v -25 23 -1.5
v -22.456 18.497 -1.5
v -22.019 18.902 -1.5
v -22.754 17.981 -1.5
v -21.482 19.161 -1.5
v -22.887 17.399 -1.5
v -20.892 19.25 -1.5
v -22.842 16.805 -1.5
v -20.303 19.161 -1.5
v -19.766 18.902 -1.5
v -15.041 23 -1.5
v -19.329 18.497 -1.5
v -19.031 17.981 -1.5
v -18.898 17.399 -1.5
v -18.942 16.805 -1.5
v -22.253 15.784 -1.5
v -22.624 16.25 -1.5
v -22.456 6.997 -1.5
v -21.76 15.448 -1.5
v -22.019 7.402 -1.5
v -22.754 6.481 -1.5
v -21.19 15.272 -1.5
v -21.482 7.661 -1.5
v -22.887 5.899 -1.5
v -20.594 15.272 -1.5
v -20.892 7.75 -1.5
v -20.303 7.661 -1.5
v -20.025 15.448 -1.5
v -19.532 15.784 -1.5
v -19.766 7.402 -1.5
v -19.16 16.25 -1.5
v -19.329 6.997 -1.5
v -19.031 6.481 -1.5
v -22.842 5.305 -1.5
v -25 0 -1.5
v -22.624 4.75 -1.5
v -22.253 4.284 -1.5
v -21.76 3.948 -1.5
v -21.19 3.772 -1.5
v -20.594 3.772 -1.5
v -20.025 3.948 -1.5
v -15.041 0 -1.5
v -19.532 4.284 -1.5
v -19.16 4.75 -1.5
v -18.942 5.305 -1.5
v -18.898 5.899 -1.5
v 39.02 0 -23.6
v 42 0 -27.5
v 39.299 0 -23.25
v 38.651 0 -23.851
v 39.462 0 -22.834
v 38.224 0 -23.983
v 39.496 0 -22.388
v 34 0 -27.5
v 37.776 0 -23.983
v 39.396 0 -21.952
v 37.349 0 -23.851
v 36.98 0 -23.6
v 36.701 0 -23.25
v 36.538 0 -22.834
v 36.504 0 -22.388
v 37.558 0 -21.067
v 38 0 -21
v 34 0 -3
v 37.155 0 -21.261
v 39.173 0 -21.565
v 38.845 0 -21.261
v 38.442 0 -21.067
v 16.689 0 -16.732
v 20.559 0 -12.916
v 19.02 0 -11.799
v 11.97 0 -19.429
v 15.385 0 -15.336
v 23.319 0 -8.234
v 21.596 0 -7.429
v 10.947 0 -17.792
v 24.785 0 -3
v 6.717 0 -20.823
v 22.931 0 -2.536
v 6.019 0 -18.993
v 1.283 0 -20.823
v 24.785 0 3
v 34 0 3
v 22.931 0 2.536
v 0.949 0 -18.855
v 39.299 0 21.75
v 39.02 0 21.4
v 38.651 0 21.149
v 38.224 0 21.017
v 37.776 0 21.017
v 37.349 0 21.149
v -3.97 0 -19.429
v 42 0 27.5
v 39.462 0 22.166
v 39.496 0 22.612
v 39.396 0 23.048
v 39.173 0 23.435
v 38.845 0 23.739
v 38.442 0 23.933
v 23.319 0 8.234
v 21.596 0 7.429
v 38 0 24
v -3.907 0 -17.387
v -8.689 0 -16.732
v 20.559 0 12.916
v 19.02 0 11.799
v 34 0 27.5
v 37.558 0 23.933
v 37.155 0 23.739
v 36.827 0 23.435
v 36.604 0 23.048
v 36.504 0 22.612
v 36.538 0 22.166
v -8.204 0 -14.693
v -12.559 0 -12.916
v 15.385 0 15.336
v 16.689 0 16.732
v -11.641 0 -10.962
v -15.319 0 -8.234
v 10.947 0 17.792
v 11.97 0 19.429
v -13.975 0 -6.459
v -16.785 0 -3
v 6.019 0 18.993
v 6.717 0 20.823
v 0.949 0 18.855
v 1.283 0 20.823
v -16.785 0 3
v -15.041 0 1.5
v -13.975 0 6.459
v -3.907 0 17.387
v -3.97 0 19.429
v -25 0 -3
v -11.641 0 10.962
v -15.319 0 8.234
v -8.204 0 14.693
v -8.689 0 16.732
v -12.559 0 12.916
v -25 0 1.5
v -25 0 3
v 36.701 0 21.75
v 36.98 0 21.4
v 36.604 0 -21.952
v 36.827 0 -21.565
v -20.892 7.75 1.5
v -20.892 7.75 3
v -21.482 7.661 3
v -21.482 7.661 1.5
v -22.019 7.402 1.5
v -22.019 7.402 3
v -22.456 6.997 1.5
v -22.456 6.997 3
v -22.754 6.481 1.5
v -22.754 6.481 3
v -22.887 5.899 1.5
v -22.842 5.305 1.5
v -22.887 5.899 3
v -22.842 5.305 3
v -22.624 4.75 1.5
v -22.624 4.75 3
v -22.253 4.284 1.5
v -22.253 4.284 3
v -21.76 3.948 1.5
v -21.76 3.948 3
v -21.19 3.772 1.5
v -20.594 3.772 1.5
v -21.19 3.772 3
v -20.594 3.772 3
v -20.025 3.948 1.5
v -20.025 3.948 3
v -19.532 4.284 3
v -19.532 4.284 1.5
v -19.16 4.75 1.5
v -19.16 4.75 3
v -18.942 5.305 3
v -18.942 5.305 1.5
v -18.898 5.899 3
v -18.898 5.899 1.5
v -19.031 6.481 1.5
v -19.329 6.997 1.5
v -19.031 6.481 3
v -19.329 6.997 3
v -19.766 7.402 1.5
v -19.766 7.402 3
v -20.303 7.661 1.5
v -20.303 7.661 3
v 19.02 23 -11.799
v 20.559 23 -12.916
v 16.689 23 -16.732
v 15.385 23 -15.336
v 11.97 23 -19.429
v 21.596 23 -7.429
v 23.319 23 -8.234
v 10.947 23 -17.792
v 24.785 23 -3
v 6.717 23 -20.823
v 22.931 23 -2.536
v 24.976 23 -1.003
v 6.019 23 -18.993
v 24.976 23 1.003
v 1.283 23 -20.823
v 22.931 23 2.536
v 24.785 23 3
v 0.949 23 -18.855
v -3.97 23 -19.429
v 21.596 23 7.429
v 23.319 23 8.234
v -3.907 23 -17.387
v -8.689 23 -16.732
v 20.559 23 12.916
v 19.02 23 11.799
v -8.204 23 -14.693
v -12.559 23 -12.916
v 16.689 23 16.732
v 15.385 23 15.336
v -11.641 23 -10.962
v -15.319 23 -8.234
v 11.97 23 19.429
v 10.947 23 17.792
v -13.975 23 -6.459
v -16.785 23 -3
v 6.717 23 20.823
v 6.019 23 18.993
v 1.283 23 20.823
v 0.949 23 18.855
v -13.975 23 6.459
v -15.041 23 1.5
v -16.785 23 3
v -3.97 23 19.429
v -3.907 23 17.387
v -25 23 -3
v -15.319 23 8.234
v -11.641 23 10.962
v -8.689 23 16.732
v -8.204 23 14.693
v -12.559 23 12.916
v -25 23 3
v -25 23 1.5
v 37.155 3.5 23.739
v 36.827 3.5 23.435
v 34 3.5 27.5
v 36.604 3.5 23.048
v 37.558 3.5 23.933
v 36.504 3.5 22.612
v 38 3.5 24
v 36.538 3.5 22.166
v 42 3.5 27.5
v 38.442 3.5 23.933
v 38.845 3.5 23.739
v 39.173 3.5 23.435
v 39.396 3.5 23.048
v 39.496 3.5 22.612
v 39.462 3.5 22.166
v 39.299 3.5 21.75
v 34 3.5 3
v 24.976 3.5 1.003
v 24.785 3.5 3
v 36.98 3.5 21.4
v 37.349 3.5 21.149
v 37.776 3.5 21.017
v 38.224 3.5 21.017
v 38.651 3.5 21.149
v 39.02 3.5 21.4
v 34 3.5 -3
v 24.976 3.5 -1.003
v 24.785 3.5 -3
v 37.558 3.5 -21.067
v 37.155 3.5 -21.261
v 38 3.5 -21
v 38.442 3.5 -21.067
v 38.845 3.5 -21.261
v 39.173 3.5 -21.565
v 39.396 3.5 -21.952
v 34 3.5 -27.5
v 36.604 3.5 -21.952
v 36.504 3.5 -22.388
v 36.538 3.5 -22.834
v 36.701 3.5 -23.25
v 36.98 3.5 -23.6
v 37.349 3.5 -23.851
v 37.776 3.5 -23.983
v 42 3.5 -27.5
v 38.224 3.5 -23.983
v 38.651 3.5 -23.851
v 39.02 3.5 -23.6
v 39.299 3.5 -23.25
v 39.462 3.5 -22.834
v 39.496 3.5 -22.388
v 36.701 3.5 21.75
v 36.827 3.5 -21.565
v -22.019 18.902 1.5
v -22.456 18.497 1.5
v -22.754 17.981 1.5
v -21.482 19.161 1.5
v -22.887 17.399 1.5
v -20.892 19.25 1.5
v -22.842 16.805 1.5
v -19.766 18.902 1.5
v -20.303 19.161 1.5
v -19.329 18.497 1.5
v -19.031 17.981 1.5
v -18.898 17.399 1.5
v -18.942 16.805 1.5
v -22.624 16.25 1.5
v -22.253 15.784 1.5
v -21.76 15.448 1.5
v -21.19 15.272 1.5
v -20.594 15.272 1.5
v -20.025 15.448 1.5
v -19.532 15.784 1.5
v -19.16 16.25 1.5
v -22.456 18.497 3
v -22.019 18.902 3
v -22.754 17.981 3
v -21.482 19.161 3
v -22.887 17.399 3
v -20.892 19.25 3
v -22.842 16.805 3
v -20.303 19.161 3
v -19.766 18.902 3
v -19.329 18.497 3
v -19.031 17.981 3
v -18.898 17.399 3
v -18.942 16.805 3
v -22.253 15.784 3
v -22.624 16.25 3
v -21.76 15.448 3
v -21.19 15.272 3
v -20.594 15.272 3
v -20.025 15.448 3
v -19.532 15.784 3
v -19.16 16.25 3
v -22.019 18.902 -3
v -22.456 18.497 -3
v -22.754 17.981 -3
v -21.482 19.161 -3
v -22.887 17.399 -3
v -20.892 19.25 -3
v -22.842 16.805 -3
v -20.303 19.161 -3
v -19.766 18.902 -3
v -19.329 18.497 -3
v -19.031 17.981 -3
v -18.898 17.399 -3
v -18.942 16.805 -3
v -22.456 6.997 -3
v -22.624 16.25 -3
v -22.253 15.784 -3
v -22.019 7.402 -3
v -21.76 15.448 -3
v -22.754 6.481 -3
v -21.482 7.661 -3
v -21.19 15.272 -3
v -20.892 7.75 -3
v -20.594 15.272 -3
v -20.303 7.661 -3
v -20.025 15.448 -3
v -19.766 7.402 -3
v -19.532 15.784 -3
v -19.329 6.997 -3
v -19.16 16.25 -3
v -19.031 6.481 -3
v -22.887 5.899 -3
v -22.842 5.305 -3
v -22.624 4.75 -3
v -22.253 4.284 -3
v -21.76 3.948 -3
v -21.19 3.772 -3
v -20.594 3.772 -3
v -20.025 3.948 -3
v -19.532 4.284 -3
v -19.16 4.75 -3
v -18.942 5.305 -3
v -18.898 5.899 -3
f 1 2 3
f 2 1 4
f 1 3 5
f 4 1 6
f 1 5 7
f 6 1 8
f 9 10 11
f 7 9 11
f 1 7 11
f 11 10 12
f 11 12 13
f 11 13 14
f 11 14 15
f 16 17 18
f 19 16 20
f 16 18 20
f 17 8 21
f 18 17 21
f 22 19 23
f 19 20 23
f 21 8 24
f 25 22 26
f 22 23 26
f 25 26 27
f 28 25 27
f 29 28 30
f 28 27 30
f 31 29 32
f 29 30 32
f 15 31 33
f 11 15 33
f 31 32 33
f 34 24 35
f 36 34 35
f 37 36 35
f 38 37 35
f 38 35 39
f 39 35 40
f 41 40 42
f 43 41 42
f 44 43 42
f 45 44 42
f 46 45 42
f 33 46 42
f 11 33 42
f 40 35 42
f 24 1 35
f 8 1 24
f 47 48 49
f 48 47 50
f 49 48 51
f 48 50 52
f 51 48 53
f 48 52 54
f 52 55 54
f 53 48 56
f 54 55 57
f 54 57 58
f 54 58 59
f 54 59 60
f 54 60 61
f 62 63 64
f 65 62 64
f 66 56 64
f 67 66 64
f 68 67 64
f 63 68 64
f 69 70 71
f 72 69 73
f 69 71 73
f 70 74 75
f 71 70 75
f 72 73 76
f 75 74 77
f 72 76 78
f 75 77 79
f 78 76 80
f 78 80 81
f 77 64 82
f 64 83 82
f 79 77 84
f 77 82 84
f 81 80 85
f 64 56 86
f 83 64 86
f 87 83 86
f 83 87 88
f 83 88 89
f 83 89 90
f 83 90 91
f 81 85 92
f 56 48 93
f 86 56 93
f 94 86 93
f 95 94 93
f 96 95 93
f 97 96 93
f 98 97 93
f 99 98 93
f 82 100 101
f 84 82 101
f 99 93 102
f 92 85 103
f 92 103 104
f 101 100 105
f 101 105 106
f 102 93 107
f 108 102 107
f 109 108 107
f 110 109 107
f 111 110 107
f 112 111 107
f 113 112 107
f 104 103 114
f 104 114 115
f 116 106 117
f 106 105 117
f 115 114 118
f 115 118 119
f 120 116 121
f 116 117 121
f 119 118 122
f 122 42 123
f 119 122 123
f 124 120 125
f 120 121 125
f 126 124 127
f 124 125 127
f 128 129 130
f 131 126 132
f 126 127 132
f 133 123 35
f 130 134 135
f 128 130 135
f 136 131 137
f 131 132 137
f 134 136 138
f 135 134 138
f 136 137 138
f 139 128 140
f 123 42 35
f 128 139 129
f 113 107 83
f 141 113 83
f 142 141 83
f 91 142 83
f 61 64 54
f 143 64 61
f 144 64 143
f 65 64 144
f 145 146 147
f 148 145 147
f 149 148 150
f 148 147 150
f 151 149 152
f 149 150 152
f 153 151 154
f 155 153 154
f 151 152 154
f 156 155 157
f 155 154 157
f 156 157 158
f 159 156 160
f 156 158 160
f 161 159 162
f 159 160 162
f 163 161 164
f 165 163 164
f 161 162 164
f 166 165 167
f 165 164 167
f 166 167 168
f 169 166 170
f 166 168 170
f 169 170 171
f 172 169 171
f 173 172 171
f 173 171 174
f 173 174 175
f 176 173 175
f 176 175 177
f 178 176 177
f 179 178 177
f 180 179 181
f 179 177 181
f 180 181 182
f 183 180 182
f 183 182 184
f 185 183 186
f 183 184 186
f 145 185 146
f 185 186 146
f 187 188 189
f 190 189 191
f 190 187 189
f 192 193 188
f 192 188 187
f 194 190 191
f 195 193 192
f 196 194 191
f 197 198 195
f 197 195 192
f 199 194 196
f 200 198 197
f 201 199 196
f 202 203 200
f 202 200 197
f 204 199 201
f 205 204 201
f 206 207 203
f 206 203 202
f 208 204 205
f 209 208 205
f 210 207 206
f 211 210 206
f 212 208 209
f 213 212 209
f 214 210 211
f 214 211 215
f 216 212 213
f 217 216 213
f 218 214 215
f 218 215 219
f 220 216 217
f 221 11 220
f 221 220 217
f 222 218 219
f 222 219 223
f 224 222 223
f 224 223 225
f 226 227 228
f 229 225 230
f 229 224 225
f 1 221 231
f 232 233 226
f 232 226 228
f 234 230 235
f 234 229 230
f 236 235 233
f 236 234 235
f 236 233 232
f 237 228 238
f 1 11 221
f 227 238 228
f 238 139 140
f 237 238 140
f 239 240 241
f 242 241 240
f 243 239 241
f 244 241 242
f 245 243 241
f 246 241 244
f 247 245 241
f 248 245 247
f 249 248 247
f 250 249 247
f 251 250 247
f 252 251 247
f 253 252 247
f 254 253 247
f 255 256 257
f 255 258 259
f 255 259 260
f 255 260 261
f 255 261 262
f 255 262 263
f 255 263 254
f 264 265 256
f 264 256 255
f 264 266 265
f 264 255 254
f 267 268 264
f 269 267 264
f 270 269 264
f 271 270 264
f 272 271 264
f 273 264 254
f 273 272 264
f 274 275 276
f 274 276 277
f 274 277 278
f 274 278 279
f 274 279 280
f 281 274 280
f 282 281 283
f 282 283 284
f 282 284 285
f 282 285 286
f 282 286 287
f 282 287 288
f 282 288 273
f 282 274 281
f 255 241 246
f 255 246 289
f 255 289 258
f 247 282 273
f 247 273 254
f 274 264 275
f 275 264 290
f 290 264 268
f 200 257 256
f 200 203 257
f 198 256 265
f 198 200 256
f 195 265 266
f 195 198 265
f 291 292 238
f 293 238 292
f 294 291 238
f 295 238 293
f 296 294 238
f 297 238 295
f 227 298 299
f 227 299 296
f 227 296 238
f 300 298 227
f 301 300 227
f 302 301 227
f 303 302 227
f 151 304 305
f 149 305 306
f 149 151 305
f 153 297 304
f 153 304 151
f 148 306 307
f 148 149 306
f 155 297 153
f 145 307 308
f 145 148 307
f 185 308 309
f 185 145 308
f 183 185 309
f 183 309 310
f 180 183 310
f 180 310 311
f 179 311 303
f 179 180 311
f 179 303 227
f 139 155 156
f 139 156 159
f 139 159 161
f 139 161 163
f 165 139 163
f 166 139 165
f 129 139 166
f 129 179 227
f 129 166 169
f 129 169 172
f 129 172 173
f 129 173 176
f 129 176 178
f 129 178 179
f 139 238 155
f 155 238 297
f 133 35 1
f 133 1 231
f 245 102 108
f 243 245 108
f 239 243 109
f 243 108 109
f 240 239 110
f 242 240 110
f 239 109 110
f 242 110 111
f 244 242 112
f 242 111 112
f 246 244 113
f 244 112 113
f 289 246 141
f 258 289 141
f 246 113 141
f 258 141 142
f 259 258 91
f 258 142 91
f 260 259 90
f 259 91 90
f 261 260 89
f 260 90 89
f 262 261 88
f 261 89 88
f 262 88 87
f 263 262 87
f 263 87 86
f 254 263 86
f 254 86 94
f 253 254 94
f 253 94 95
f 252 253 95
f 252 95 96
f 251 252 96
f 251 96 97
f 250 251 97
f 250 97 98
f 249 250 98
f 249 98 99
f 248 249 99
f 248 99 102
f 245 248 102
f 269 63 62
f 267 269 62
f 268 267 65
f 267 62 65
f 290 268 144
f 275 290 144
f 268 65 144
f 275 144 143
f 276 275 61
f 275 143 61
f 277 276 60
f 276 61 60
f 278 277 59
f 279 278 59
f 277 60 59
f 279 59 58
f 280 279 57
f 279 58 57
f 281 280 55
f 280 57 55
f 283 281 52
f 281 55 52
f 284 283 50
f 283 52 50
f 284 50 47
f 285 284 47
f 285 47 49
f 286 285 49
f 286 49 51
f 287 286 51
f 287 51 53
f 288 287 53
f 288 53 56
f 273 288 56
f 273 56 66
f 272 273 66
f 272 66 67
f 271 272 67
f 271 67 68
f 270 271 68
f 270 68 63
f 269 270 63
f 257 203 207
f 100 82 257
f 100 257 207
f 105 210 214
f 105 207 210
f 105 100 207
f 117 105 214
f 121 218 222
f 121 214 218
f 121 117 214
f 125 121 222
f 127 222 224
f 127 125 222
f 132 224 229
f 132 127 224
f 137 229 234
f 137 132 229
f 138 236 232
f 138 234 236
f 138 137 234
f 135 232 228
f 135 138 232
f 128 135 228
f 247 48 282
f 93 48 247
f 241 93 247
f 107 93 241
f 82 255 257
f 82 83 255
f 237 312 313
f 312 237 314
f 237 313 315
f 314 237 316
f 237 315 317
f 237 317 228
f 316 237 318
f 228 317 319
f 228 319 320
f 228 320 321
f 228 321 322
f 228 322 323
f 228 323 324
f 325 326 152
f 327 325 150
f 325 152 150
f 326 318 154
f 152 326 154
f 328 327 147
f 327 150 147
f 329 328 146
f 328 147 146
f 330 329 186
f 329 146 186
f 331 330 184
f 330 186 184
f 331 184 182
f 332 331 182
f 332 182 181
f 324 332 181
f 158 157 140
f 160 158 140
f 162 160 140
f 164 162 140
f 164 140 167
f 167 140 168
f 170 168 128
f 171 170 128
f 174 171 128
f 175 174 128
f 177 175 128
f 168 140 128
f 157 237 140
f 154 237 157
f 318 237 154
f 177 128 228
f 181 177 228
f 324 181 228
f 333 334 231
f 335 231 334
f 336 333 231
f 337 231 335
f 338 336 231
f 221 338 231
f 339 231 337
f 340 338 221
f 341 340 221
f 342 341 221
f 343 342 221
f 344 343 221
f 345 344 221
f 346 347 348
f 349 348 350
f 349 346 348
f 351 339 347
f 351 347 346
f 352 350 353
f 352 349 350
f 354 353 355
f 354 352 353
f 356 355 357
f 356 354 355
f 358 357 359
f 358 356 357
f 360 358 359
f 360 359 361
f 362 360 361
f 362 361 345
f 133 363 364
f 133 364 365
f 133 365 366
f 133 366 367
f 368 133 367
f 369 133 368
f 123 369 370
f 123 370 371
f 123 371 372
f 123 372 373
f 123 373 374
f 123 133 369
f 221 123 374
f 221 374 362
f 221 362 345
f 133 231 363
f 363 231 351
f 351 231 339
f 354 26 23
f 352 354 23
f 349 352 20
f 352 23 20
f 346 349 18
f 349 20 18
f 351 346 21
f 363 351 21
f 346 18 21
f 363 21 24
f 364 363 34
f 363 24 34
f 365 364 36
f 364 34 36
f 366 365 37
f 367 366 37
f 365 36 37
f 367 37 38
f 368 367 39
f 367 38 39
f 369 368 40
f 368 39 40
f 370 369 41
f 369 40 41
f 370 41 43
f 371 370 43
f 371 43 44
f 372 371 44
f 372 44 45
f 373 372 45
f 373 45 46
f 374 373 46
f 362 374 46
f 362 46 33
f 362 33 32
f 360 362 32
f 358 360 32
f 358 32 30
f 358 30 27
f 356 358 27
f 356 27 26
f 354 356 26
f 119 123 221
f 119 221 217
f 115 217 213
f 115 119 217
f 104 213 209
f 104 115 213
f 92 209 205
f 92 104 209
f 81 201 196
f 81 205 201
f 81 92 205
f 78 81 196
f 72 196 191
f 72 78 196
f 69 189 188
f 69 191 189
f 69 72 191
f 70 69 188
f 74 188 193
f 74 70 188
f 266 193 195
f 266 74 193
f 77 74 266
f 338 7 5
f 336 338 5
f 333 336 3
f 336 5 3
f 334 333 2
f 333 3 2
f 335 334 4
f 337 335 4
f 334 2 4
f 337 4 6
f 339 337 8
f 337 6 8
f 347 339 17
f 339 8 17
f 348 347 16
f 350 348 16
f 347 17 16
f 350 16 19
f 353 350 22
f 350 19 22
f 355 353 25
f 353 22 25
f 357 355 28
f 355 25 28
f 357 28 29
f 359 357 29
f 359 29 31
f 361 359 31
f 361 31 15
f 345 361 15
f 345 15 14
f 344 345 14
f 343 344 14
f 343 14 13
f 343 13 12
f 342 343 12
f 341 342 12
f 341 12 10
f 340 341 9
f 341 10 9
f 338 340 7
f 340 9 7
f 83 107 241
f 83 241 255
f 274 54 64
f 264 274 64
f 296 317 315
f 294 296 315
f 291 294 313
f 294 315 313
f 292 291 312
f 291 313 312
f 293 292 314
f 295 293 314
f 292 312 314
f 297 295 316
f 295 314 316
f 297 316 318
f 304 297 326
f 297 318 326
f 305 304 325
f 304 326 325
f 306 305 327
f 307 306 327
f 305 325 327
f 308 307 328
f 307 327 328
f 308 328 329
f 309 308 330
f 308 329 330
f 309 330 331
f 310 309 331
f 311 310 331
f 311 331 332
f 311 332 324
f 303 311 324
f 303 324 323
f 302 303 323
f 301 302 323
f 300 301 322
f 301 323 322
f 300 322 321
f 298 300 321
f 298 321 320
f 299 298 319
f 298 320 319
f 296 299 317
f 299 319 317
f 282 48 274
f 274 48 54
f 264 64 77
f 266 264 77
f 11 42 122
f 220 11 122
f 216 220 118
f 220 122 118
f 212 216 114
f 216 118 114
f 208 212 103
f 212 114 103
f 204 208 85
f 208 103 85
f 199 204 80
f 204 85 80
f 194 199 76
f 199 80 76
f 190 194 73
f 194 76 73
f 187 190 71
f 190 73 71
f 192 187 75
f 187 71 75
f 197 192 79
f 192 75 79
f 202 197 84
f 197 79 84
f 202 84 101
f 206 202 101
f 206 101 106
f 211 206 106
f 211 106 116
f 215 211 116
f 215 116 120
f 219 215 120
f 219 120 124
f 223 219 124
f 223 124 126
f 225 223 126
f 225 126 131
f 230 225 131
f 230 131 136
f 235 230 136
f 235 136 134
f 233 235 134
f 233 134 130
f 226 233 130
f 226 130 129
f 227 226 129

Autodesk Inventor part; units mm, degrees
ref_plane "YZ Plane" through (0, 0, 0) normal (1, 0, 0) x (0, 1, 0)
ref_plane "XZ Plane" through (0, 0, 0) normal (0, 1, 0) x (-1, 0, 0)
ref_plane "XY Plane" through (0, 0, 0) normal (0, 0, 1) x (1, 0, 0)
sketch "Sketch1" plane through (0, 0, 0) normal (0, 1, 0) x (-1, 0, 0)
  arc A0 (16.9801, 0.913) -> (16.9801, -0.913) centre (-4, 0) ccw
  circle A1 centre (-4, 0) radius 21
  circle A2 centre (-4, 0) radius 19.1
  line L0 (17, 0) -> (25, 0)
  line L1 (25, 0) -> (25, -1.5)
  line L2 (25, -1.5) -> (15.041, -1.5)
  line L3 (25, 0) -> (25, 1.5)
  line L4 (25, 1.5) -> (15.041, 1.5)
  line L5 (25, -1.5) -> (25, -3)
  line L6 (25, -3) -> (14.8629, -3)
  line L7 (25, 1.5) -> (25, 3)
  line L8 (25, 3) -> (14.8629, 3)
  line L9 (-25, 0) -> (-34, 0)
  line L10 (-34, 0) -> (-42, 0)
  line L11 (-42, 0) -> (-42, 27.5)
  line L12 (-42, 27.5) -> (-34, 27.5)
  line L13 (-34, 27.5) -> (-34, 0)
  line L14 (-42, 0) -> (-42, -27.5)
  line L15 (-42, -27.5) -> (-34, -27.5)
  line L16 (-34, -27.5) -> (-34, 0)
  line L17 (-29.5, 0) -> (-29.5, 3)
  line L18 (-29.5, 3) -> (-24.7846, 3)
  line L19 (-29.5, 3) -> (-34, 3)
  line L20 (-29.5, 0) -> (-29.5, -3)
  line L21 (-29.5, -3) -> (-24.7846, -3)
  line L22 (-29.5, -3) -> (-34, -3)
  point P0 (-22.9783, -26)
  point P1 (16.7846, 3)
  point P2 (16.7846, -3)
  point P3 (-24.7846, 3)
  dimension "d8" = 38.2
  dimension "d9" = 8
  dimension "d10" = 1.5
  dimension "d11" = 1.5
  dimension "d12" = 1.5
  dimension "d13" = 1.5
  dimension "d31" = 21
  dimension "d60" = 9
  dimension "d61" = 8
  dimension "d62" = 27.5
  dimension "d63" = 27.5
  dimension "d64" = 3
  dimension "d65" = 3
extrude "Extrusion1" add sketch "Sketch1" along normal blind 23 contours A0 L8 A2 L6 | A0 L9 L17 L18 | A0 L21 L20 L9 | L8 L7 L4 A0 | A0 L4 A2 L8 | L17 L9 L13 L19 | L20 L22 L16 L9 | L13 L10 L11 L12 | L6 A2 L2 A0 | A0 L2 L5 L6 | L16 L15 L14 L10
sketch "Sketch4" plane through (-16.7846, 0, -3) normal (0, 0, -1) x (-1, 0, 0)
  line L0 (0, 0) -> (-41.5692, 0) projected
  line L1 (8.2154, 0) -> (8.2154, 23) projected
  line L2 (0, 0) -> (8.2154, 0)
  line L3 (8.2154, 0) -> (8.2154, 23)
  line L4 (8.2154, 23) -> (0, 23)
  line L5 (0, 23) -> (0, 0)
  line L6 (0, 11.5) -> (8.2154, 11.5)
  line L7 (4.1077, 11.5) -> (4.1077, 23)
  line L8 (4.1077, 11.5) -> (4.1077, 0)
  point P0 (-16.7846, 0)
  point P1 (4.1077, 5.75)
  point P2 (4.1077, 17.25)
hole "Hole2" at (-20.8923, 5.75, -3) at (-20.8923, 17.25, -3) direction (0, 0, 1) diameter 4 depth 8 tip angle 118
sketch "Sketch8" plane through (0, 23, 0) normal (0, 1, 0) x (1, 0, 0)
  line L0 (34, 3) -> (24.7846, 3) projected
  line L1 (34, 3) -> (24.7846, 3)
  line L2 (34, 27.5) -> (34, 3) projected
  line L3 (34, 3) -> (34, 27.5)
  line L4 (42, -27.5) -> (42, 27.5) projected
  line L5 (34, 27.5) -> (42, 27.5)
  line L6 (42, 27.5) -> (42, -27.5)
  line L7 (42, -27.5) -> (34, -27.5)
  line L8 (24.7846, -3) -> (34, -3) projected
  line L9 (34, -27.5) -> (34, -3)
  line L10 (34, -3) -> (24.7846, -3)
  arc A0 (24.7846, 3) -> (-16.7846, 3) centre (4, 0) ccw projected
  line L11 (4, 21) -> (4, 0)
  circle A1 centre (4, 0) radius 21
  point P0 (0, 0)
  point P1 (24.7846, 3)
  point P2 (24.7846, -3)
  dimension "d78" = 42
extrude "Extrusion5" cut sketch "Sketch8" against normal blind 19.5 contours L2 L5 L4 L7 L9 L8 A1 L0
sketch "Sketch9" plane through (0, 3.5, 0) normal (0, 1, 0) x (1, 0, 0)
  line L0 (34, 3) -> (34, 27.5) projected
  line L1 (34, -3) -> (34, 3)
  line L2 (34, 3) -> (34, 0)
  line L3 (42, 27.5) -> (42, -27.5) projected
  line L4 (42, 0) -> (34, 0)
  line L5 (38, 0) -> (38, -22.5)
  line L6 (38, 0) -> (38, 22.5)
  point P0 (0, 0)
  dimension "d69" = 22.5
  dimension "d70" = 22.5
hole "Hole4" at (38, 3.5, -22.5) at (38, 3.5, 22.5) direction (0, -1, 0) diameter 3 depth 8 tip angle 118
properties part number "Bracket kamera"
